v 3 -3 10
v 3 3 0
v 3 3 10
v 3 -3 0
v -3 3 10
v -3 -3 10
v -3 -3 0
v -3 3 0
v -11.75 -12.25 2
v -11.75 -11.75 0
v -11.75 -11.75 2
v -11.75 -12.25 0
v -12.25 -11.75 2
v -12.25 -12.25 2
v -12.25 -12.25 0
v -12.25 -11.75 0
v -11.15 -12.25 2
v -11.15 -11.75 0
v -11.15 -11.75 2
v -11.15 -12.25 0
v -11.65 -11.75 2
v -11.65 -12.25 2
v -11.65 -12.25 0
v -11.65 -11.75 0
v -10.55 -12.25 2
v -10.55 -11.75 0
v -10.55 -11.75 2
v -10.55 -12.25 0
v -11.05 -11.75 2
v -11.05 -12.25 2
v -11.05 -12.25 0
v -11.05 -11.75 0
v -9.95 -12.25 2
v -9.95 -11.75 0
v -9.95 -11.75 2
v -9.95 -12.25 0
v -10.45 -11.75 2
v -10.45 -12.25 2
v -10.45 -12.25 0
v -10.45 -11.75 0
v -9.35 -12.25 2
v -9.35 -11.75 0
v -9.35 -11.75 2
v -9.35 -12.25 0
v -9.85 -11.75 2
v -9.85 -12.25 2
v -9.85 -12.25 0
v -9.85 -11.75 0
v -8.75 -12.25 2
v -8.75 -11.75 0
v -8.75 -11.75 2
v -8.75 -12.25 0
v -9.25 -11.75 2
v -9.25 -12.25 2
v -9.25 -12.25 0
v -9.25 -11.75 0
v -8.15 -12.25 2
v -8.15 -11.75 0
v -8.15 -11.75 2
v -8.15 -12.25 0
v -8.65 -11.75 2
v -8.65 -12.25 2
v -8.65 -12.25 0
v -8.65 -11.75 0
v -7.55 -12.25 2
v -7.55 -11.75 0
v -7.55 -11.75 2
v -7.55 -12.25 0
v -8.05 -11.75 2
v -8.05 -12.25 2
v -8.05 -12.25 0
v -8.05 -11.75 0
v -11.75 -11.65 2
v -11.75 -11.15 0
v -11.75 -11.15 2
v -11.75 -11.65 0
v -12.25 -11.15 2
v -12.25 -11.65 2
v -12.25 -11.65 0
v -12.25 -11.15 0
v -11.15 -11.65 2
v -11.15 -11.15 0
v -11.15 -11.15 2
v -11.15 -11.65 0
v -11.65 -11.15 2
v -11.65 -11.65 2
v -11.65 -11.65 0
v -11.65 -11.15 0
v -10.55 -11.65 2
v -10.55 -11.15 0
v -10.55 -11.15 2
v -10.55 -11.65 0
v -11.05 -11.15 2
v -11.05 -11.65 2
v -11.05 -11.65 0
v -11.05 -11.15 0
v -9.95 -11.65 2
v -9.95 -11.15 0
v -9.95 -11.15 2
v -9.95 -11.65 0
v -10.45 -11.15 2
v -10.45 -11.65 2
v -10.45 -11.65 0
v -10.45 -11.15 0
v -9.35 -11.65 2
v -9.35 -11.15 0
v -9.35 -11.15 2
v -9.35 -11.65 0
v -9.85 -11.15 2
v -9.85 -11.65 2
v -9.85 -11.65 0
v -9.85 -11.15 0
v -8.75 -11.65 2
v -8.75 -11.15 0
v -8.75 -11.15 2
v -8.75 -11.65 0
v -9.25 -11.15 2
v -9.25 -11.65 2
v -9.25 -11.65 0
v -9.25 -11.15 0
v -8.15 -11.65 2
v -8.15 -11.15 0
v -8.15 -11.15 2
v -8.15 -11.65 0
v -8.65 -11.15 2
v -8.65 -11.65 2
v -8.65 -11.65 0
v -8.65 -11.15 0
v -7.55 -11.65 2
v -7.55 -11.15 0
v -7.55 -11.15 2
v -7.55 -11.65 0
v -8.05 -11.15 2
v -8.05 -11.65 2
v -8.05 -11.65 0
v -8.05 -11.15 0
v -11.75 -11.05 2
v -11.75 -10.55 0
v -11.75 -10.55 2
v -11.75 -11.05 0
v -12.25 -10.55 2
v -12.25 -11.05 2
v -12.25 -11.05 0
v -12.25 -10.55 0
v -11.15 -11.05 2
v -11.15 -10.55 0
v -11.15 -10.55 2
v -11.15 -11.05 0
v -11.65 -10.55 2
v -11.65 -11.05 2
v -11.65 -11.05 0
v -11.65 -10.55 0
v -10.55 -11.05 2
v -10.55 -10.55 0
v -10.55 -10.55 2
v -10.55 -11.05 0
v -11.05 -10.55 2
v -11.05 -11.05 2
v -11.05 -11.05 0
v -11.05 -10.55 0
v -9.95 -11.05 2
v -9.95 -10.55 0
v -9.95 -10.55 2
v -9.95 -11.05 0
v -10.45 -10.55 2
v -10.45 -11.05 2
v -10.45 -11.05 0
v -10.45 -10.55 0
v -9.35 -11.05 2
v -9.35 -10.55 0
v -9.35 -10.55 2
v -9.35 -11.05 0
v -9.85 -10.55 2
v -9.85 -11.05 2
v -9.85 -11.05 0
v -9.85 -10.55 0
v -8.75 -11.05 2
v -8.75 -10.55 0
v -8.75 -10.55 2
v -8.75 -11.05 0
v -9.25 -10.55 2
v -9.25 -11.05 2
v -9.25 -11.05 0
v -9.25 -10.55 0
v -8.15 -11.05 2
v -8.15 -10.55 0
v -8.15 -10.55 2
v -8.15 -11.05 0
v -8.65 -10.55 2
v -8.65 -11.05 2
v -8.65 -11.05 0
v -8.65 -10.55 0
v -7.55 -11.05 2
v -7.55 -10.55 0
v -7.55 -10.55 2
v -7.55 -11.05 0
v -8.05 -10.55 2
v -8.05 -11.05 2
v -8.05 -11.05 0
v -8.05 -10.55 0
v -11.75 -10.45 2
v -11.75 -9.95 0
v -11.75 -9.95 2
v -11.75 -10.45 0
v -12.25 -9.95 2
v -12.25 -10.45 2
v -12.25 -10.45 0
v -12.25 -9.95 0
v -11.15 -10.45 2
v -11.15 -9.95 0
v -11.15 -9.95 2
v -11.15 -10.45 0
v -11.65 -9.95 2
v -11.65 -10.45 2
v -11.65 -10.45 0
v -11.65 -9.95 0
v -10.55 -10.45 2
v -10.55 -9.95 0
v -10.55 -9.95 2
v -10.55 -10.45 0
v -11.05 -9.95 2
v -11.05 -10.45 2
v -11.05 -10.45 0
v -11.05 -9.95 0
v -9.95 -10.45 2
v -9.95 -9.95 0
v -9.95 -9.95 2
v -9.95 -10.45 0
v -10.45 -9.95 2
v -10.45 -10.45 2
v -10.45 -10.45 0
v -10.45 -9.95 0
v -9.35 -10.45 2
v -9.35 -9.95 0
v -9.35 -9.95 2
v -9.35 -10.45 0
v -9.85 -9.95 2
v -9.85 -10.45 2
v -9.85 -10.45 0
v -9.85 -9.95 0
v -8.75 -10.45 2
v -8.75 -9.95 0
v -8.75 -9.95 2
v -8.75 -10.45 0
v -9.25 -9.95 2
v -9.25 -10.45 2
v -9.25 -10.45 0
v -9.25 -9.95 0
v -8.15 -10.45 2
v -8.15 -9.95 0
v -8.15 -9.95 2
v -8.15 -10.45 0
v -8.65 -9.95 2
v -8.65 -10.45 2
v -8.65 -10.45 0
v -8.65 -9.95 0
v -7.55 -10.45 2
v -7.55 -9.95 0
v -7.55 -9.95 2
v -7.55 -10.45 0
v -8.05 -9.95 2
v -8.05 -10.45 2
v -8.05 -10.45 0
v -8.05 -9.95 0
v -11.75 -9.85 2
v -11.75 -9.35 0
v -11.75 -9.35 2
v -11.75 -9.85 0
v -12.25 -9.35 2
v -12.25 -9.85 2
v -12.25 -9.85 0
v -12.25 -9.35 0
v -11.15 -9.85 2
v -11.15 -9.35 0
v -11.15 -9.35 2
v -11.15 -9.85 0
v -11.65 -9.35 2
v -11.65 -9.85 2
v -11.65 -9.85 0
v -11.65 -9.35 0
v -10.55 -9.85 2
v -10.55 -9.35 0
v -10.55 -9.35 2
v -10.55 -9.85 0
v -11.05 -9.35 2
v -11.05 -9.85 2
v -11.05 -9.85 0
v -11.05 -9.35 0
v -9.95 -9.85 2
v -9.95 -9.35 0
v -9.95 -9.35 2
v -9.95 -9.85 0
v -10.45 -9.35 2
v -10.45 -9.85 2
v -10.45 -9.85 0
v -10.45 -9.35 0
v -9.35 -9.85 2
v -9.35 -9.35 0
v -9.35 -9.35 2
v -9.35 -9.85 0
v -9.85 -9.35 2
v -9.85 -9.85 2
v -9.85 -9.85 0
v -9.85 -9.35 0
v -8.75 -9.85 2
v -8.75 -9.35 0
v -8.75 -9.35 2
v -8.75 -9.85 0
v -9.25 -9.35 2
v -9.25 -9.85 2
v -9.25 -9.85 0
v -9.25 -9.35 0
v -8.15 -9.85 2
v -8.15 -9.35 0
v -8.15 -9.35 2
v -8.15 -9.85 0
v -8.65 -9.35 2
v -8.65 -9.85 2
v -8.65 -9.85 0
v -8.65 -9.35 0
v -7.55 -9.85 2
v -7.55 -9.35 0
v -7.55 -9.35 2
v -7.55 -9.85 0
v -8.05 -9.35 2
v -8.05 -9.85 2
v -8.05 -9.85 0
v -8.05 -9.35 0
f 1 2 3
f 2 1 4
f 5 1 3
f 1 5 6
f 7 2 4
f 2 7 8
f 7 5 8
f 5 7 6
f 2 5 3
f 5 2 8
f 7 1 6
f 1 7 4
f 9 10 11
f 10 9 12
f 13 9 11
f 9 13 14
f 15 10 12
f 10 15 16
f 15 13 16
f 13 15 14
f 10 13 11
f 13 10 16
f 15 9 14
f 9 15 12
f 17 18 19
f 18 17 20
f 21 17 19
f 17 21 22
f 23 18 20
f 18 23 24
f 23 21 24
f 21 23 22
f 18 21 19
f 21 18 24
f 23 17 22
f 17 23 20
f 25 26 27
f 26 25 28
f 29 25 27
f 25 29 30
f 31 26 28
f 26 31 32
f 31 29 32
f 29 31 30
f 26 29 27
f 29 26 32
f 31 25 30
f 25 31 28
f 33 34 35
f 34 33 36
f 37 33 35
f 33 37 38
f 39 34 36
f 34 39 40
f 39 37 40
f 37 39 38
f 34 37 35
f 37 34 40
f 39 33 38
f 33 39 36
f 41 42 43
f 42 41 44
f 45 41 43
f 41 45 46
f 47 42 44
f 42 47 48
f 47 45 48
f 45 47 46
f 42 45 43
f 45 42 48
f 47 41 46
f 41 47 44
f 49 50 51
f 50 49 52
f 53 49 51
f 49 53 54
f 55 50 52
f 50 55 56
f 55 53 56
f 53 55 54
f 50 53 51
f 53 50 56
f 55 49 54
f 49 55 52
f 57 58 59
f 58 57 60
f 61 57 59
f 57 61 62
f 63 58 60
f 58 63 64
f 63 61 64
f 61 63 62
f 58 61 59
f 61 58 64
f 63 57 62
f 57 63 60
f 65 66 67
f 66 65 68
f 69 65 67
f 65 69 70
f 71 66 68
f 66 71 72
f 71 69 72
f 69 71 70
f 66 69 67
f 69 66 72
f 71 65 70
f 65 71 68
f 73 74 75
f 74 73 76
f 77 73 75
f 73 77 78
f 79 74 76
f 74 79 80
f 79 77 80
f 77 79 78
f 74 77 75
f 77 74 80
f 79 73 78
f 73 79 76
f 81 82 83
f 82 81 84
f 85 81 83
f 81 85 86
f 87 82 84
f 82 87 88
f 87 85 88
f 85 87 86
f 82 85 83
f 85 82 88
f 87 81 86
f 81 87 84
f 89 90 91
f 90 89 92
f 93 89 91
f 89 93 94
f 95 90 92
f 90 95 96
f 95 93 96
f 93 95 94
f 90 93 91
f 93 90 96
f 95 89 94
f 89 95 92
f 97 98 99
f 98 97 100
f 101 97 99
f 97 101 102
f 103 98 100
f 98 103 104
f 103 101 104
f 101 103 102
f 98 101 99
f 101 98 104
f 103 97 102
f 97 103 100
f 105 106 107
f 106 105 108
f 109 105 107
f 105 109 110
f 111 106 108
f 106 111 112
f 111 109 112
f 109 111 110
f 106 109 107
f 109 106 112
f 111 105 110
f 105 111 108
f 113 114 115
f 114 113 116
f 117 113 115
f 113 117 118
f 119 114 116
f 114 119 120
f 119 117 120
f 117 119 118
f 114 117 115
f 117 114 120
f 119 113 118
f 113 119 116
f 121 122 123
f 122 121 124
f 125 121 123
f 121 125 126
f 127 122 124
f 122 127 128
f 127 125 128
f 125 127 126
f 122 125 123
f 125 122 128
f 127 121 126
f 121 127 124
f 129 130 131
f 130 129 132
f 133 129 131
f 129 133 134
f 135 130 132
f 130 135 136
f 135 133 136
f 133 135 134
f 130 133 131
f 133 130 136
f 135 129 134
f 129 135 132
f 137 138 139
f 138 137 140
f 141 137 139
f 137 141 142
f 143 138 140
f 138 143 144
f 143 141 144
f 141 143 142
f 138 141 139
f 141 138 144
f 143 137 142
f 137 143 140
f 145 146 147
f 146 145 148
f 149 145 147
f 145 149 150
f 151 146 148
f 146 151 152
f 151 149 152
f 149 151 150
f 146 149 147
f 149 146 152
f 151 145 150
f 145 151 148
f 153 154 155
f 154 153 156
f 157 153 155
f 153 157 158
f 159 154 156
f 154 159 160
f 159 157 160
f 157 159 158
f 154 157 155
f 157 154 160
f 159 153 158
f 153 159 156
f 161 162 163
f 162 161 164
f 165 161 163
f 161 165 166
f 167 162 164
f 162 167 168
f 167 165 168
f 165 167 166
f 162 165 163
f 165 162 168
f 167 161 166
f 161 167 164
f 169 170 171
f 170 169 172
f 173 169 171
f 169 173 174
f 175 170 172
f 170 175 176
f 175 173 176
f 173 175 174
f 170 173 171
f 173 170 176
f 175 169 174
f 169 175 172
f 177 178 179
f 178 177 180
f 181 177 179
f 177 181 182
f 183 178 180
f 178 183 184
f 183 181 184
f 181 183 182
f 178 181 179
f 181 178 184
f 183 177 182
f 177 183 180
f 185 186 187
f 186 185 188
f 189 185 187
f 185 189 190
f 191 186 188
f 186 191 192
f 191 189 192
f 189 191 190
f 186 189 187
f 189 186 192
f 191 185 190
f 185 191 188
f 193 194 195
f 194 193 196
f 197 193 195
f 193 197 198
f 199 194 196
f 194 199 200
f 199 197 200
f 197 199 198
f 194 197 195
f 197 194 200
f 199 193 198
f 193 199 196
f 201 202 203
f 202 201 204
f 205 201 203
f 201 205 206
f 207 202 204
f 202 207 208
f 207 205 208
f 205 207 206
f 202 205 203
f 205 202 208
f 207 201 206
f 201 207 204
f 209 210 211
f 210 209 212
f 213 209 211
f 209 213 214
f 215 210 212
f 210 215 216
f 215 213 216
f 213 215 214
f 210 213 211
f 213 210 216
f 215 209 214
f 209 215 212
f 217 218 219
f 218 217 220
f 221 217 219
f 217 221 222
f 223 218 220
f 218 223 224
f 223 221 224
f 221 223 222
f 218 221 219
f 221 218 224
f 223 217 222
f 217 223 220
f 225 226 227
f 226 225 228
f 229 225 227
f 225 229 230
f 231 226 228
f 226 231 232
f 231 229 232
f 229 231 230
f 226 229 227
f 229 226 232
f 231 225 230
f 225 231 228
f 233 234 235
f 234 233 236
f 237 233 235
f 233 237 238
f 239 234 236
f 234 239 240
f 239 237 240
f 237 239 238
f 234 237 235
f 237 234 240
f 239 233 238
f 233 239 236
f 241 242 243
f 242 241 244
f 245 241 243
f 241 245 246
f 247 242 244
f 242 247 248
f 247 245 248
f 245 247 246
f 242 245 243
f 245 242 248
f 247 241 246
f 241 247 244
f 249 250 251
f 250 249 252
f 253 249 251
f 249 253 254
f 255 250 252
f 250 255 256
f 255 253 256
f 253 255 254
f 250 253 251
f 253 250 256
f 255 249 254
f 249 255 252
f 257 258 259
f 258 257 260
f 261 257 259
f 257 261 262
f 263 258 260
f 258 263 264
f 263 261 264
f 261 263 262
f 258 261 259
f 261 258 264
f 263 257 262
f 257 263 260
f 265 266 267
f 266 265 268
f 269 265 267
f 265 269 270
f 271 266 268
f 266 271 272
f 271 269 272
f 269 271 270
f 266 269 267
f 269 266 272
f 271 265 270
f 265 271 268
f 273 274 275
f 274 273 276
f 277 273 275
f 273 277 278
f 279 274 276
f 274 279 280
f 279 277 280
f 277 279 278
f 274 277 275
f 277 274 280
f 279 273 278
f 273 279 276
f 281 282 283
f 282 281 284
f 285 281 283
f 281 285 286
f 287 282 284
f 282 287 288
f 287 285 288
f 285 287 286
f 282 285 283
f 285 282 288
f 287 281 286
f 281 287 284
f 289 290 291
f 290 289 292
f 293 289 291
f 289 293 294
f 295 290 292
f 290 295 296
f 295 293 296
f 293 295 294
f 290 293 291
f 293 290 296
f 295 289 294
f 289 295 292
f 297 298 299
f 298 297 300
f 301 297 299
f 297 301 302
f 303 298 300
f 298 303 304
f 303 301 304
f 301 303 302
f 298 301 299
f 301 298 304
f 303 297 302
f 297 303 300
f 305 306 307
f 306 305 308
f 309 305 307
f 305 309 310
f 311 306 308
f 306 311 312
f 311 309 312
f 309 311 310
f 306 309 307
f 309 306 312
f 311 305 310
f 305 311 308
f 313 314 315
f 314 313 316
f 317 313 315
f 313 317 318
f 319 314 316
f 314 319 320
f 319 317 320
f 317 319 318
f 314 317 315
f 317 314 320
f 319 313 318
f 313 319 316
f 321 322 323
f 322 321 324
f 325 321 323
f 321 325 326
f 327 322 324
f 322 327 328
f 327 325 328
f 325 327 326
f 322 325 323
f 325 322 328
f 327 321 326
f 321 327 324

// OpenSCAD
translate([0, 0, 5]) color([0,1,0,0.9]) cube([6, 6, 10], center=true);
translate([-12, -12, 1]) color([1,0,0]) cube([0.5, 0.5, 2], center=true);
translate([-11.4, -12, 1]) color([1,0,0]) cube([0.5, 0.5, 2], center=true);
translate([-10.8, -12, 1]) color([1,0,0]) cube([0.5, 0.5, 2], center=true);
translate([-10.2, -12, 1]) color([1,0,0]) cube([0.5, 0.5, 2], center=true);
translate([-9.6, -12, 1]) color([1,0,0]) cube([0.5, 0.5, 2], center=true);
translate([-9, -12, 1]) color([1,0,0]) cube([0.5, 0.5, 2], center=true);
translate([-8.4, -12, 1]) color([1,0,0]) cube([0.5, 0.5, 2], center=true);
translate([-7.8, -12, 1]) color([1,0,0]) cube([0.5, 0.5, 2], center=true);
translate([-12, -11.4, 1]) color([1,0,0]) cube([0.5, 0.5, 2], center=true);
translate([-11.4, -11.4, 1]) color([1,0,0]) cube([0.5, 0.5, 2], center=true);
translate([-10.8, -11.4, 1]) color([1,0,0]) cube([0.5, 0.5, 2], center=true);
translate([-10.2, -11.4, 1]) color([1,0,0]) cube([0.5, 0.5, 2], center=true);
translate([-9.6, -11.4, 1]) color([1,0,0]) cube([0.5, 0.5, 2], center=true);
translate([-9, -11.4, 1]) color([1,0,0]) cube([0.5, 0.5, 2], center=true);
translate([-8.4, -11.4, 1]) color([1,0,0]) cube([0.5, 0.5, 2], center=true);
translate([-7.8, -11.4, 1]) color([1,0,0]) cube([0.5, 0.5, 2], center=true);
translate([-12, -10.8, 1]) color([1,0,0]) cube([0.5, 0.5, 2], center=true);
translate([-11.4, -10.8, 1]) color([1,0,0]) cube([0.5, 0.5, 2], center=true);
translate([-10.8, -10.8, 1]) color([1,0,0]) cube([0.5, 0.5, 2], center=true);
translate([-10.2, -10.8, 1]) color([1,0,0]) cube([0.5, 0.5, 2], center=true);
translate([-9.6, -10.8, 1]) color([1,0,0]) cube([0.5, 0.5, 2], center=true);
translate([-9, -10.8, 1]) color([1,0,0]) cube([0.5, 0.5, 2], center=true);
translate([-8.4, -10.8, 1]) color([1,0,0]) cube([0.5, 0.5, 2], center=true);
translate([-7.8, -10.8, 1]) color([1,0,0]) cube([0.5, 0.5, 2], center=true);
translate([-12, -10.2, 1]) color([1,0,0]) cube([0.5, 0.5, 2], center=true);
translate([-11.4, -10.2, 1]) color([1,0,0]) cube([0.5, 0.5, 2], center=true);
translate([-10.8, -10.2, 1]) color([1,0,0]) cube([0.5, 0.5, 2], center=true);
translate([-10.2, -10.2, 1]) color([1,0,0]) cube([0.5, 0.5, 2], center=true);
translate([-9.6, -10.2, 1]) color([1,0,0]) cube([0.5, 0.5, 2], center=true);
translate([-9, -10.2, 1]) color([1,0,0]) cube([0.5, 0.5, 2], center=true);
translate([-8.4, -10.2, 1]) color([1,0,0]) cube([0.5, 0.5, 2], center=true);
translate([-7.8, -10.2, 1]) color([1,0,0]) cube([0.5, 0.5, 2], center=true);
translate([-12, -9.6, 1]) color([1,0,0]) cube([0.5, 0.5, 2], center=true);
translate([-11.4, -9.6, 1]) color([1,0,0]) cube([0.5, 0.5, 2], center=true);
translate([-10.8, -9.6, 1]) color([1,0,0]) cube([0.5, 0.5, 2], center=true);
translate([-10.2, -9.6, 1]) color([1,0,0]) cube([0.5, 0.5, 2], center=true);
translate([-9.6, -9.6, 1]) color([1,0,0]) cube([0.5, 0.5, 2], center=true);
translate([-9, -9.6, 1]) color([1,0,0]) cube([0.5, 0.5, 2], center=true);
translate([-8.4, -9.6, 1]) color([1,0,0]) cube([0.5, 0.5, 2], center=true);
translate([-7.8, -9.6, 1]) color([1,0,0]) cube([0.5, 0.5, 2], center=true);
